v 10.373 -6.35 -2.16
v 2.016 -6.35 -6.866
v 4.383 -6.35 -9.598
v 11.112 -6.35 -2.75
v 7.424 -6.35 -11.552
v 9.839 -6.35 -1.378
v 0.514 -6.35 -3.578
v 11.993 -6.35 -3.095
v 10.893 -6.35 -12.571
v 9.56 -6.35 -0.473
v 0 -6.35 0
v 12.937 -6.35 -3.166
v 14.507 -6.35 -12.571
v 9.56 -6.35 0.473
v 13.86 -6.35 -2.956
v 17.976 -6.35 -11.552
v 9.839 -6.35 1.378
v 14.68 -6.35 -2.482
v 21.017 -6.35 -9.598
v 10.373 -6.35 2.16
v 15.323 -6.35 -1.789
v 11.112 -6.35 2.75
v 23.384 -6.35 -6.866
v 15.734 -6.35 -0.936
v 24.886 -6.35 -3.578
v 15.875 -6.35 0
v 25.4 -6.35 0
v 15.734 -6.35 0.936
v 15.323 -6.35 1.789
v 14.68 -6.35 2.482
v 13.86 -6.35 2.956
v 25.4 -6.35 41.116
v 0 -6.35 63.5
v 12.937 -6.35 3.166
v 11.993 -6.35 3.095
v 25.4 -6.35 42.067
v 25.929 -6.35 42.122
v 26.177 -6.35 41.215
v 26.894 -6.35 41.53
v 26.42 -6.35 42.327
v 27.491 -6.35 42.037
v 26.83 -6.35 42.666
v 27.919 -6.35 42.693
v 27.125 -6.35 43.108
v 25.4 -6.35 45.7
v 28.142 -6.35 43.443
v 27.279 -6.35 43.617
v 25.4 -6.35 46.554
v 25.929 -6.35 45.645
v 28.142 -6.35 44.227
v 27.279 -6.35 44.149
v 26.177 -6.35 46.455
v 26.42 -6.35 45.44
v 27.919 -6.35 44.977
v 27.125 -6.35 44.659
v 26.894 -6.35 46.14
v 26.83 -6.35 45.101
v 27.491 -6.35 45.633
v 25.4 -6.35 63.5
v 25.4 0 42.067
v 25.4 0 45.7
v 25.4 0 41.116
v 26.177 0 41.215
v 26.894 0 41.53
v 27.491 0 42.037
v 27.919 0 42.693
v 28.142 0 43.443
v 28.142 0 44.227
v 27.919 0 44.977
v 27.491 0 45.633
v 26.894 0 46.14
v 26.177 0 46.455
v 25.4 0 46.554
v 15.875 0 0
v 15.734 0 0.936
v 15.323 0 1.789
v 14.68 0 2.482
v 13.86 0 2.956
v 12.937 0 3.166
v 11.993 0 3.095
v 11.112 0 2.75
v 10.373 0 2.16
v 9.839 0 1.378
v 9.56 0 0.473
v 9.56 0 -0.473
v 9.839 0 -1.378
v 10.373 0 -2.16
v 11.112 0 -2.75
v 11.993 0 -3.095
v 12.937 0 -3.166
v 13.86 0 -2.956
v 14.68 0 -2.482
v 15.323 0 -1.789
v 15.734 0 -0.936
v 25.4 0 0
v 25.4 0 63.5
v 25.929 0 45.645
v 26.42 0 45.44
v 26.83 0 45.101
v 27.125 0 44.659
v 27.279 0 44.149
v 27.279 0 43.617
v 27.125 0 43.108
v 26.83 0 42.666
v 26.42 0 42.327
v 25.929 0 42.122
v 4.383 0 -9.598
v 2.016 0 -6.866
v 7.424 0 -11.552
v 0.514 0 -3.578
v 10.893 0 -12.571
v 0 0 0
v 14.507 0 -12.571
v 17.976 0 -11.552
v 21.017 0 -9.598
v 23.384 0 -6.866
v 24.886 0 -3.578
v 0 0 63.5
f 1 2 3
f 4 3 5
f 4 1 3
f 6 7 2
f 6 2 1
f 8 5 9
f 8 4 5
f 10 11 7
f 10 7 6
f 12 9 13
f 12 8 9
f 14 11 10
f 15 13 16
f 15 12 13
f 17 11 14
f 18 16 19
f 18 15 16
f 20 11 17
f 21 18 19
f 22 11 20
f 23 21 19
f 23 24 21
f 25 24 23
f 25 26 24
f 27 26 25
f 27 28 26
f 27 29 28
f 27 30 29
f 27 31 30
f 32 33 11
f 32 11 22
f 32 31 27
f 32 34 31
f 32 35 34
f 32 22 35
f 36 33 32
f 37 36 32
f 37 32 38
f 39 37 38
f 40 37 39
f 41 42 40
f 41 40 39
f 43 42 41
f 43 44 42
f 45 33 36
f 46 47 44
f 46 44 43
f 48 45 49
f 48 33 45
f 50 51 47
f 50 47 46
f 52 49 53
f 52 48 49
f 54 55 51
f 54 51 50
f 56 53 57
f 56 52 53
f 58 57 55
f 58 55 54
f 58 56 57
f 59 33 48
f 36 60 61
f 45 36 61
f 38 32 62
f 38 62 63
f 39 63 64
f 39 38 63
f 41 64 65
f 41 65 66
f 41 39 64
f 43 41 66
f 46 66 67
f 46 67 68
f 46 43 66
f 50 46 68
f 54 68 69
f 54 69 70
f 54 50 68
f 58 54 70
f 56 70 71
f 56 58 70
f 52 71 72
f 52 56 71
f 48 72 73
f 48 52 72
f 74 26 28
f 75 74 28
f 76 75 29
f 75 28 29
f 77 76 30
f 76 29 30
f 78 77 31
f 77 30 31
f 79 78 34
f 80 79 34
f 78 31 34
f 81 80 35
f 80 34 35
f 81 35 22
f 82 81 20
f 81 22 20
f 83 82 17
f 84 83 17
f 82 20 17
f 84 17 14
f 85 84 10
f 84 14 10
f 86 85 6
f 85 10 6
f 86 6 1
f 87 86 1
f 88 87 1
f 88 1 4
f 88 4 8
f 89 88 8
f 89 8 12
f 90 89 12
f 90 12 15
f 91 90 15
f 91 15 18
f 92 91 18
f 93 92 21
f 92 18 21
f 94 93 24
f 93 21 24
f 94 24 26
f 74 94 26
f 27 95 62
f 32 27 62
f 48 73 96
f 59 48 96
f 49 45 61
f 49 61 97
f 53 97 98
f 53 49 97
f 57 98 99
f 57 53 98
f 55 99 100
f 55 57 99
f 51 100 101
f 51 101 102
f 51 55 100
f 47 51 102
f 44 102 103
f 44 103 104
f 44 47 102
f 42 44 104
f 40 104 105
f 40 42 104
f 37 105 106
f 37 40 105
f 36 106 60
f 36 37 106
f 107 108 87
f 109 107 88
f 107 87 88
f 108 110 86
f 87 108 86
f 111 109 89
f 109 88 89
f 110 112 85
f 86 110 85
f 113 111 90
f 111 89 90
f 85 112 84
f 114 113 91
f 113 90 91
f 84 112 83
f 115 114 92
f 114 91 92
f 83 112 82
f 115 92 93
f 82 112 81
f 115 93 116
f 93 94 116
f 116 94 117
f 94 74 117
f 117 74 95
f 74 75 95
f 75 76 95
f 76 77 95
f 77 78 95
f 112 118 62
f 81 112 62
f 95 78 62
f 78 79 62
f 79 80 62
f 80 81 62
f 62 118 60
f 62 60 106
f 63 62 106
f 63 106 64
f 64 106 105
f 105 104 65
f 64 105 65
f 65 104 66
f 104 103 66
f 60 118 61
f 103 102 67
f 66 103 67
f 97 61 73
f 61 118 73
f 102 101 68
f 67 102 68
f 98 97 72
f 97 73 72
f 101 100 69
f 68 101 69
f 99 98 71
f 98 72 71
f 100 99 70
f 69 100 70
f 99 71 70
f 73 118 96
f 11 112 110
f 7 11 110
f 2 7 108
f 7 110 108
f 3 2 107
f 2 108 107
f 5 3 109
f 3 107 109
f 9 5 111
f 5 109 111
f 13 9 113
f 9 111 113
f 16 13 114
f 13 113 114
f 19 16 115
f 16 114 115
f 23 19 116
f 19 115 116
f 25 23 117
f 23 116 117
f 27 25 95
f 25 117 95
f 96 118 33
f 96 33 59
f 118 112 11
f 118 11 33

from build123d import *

# Parameters (mm, degrees)
F0_W     = 25.4
F0_H     = 63.5
F1_DEPTH = 6.35
F2_R     = 3.175
F3_DEPTH = 6.35
F5_DEPTH = 6.35


with BuildPart() as f1:
    # F0 (on Front) → F1 (new body)
    with BuildSketch(Plane.XZ):
        with Locations((12.7, 31.75)):
            Rectangle(F0_W, F0_H)
        with BuildLine():
            Line((25.4, 0), (0, 0))
            ThreePointArc((0, 0), (12.7, -12.7), (25.4, 0))
        make_face()
    extrude(amount=F1_DEPTH)

    # F2 (on face) → F3 (cut, through all)
    with BuildSketch(Plane.XZ.offset(6.35)):
        with Locations((12.7, 0)):
            Circle(F2_R)
    extrude(amount=-F3_DEPTH, mode=Mode.SUBTRACT)

    # F4 (on face) → F5 (join, through all)
    with BuildSketch(Plane.XZ.offset(6.35)):
        with BuildLine():
            Line((25.4, 42.067379), (25.4, 41.11632))
            ThreePointArc((25.4, 41.11632), (28.170174, 43.834941), (25.4, 46.553563))
            Line((25.4, 46.553563), (25.4, 45.699533))
            ThreePointArc((25.4, 45.699533), (27.298498, 43.883456), (25.4, 42.067379))
        make_face()
    extrude(amount=-F5_DEPTH)


solid = f1.part
